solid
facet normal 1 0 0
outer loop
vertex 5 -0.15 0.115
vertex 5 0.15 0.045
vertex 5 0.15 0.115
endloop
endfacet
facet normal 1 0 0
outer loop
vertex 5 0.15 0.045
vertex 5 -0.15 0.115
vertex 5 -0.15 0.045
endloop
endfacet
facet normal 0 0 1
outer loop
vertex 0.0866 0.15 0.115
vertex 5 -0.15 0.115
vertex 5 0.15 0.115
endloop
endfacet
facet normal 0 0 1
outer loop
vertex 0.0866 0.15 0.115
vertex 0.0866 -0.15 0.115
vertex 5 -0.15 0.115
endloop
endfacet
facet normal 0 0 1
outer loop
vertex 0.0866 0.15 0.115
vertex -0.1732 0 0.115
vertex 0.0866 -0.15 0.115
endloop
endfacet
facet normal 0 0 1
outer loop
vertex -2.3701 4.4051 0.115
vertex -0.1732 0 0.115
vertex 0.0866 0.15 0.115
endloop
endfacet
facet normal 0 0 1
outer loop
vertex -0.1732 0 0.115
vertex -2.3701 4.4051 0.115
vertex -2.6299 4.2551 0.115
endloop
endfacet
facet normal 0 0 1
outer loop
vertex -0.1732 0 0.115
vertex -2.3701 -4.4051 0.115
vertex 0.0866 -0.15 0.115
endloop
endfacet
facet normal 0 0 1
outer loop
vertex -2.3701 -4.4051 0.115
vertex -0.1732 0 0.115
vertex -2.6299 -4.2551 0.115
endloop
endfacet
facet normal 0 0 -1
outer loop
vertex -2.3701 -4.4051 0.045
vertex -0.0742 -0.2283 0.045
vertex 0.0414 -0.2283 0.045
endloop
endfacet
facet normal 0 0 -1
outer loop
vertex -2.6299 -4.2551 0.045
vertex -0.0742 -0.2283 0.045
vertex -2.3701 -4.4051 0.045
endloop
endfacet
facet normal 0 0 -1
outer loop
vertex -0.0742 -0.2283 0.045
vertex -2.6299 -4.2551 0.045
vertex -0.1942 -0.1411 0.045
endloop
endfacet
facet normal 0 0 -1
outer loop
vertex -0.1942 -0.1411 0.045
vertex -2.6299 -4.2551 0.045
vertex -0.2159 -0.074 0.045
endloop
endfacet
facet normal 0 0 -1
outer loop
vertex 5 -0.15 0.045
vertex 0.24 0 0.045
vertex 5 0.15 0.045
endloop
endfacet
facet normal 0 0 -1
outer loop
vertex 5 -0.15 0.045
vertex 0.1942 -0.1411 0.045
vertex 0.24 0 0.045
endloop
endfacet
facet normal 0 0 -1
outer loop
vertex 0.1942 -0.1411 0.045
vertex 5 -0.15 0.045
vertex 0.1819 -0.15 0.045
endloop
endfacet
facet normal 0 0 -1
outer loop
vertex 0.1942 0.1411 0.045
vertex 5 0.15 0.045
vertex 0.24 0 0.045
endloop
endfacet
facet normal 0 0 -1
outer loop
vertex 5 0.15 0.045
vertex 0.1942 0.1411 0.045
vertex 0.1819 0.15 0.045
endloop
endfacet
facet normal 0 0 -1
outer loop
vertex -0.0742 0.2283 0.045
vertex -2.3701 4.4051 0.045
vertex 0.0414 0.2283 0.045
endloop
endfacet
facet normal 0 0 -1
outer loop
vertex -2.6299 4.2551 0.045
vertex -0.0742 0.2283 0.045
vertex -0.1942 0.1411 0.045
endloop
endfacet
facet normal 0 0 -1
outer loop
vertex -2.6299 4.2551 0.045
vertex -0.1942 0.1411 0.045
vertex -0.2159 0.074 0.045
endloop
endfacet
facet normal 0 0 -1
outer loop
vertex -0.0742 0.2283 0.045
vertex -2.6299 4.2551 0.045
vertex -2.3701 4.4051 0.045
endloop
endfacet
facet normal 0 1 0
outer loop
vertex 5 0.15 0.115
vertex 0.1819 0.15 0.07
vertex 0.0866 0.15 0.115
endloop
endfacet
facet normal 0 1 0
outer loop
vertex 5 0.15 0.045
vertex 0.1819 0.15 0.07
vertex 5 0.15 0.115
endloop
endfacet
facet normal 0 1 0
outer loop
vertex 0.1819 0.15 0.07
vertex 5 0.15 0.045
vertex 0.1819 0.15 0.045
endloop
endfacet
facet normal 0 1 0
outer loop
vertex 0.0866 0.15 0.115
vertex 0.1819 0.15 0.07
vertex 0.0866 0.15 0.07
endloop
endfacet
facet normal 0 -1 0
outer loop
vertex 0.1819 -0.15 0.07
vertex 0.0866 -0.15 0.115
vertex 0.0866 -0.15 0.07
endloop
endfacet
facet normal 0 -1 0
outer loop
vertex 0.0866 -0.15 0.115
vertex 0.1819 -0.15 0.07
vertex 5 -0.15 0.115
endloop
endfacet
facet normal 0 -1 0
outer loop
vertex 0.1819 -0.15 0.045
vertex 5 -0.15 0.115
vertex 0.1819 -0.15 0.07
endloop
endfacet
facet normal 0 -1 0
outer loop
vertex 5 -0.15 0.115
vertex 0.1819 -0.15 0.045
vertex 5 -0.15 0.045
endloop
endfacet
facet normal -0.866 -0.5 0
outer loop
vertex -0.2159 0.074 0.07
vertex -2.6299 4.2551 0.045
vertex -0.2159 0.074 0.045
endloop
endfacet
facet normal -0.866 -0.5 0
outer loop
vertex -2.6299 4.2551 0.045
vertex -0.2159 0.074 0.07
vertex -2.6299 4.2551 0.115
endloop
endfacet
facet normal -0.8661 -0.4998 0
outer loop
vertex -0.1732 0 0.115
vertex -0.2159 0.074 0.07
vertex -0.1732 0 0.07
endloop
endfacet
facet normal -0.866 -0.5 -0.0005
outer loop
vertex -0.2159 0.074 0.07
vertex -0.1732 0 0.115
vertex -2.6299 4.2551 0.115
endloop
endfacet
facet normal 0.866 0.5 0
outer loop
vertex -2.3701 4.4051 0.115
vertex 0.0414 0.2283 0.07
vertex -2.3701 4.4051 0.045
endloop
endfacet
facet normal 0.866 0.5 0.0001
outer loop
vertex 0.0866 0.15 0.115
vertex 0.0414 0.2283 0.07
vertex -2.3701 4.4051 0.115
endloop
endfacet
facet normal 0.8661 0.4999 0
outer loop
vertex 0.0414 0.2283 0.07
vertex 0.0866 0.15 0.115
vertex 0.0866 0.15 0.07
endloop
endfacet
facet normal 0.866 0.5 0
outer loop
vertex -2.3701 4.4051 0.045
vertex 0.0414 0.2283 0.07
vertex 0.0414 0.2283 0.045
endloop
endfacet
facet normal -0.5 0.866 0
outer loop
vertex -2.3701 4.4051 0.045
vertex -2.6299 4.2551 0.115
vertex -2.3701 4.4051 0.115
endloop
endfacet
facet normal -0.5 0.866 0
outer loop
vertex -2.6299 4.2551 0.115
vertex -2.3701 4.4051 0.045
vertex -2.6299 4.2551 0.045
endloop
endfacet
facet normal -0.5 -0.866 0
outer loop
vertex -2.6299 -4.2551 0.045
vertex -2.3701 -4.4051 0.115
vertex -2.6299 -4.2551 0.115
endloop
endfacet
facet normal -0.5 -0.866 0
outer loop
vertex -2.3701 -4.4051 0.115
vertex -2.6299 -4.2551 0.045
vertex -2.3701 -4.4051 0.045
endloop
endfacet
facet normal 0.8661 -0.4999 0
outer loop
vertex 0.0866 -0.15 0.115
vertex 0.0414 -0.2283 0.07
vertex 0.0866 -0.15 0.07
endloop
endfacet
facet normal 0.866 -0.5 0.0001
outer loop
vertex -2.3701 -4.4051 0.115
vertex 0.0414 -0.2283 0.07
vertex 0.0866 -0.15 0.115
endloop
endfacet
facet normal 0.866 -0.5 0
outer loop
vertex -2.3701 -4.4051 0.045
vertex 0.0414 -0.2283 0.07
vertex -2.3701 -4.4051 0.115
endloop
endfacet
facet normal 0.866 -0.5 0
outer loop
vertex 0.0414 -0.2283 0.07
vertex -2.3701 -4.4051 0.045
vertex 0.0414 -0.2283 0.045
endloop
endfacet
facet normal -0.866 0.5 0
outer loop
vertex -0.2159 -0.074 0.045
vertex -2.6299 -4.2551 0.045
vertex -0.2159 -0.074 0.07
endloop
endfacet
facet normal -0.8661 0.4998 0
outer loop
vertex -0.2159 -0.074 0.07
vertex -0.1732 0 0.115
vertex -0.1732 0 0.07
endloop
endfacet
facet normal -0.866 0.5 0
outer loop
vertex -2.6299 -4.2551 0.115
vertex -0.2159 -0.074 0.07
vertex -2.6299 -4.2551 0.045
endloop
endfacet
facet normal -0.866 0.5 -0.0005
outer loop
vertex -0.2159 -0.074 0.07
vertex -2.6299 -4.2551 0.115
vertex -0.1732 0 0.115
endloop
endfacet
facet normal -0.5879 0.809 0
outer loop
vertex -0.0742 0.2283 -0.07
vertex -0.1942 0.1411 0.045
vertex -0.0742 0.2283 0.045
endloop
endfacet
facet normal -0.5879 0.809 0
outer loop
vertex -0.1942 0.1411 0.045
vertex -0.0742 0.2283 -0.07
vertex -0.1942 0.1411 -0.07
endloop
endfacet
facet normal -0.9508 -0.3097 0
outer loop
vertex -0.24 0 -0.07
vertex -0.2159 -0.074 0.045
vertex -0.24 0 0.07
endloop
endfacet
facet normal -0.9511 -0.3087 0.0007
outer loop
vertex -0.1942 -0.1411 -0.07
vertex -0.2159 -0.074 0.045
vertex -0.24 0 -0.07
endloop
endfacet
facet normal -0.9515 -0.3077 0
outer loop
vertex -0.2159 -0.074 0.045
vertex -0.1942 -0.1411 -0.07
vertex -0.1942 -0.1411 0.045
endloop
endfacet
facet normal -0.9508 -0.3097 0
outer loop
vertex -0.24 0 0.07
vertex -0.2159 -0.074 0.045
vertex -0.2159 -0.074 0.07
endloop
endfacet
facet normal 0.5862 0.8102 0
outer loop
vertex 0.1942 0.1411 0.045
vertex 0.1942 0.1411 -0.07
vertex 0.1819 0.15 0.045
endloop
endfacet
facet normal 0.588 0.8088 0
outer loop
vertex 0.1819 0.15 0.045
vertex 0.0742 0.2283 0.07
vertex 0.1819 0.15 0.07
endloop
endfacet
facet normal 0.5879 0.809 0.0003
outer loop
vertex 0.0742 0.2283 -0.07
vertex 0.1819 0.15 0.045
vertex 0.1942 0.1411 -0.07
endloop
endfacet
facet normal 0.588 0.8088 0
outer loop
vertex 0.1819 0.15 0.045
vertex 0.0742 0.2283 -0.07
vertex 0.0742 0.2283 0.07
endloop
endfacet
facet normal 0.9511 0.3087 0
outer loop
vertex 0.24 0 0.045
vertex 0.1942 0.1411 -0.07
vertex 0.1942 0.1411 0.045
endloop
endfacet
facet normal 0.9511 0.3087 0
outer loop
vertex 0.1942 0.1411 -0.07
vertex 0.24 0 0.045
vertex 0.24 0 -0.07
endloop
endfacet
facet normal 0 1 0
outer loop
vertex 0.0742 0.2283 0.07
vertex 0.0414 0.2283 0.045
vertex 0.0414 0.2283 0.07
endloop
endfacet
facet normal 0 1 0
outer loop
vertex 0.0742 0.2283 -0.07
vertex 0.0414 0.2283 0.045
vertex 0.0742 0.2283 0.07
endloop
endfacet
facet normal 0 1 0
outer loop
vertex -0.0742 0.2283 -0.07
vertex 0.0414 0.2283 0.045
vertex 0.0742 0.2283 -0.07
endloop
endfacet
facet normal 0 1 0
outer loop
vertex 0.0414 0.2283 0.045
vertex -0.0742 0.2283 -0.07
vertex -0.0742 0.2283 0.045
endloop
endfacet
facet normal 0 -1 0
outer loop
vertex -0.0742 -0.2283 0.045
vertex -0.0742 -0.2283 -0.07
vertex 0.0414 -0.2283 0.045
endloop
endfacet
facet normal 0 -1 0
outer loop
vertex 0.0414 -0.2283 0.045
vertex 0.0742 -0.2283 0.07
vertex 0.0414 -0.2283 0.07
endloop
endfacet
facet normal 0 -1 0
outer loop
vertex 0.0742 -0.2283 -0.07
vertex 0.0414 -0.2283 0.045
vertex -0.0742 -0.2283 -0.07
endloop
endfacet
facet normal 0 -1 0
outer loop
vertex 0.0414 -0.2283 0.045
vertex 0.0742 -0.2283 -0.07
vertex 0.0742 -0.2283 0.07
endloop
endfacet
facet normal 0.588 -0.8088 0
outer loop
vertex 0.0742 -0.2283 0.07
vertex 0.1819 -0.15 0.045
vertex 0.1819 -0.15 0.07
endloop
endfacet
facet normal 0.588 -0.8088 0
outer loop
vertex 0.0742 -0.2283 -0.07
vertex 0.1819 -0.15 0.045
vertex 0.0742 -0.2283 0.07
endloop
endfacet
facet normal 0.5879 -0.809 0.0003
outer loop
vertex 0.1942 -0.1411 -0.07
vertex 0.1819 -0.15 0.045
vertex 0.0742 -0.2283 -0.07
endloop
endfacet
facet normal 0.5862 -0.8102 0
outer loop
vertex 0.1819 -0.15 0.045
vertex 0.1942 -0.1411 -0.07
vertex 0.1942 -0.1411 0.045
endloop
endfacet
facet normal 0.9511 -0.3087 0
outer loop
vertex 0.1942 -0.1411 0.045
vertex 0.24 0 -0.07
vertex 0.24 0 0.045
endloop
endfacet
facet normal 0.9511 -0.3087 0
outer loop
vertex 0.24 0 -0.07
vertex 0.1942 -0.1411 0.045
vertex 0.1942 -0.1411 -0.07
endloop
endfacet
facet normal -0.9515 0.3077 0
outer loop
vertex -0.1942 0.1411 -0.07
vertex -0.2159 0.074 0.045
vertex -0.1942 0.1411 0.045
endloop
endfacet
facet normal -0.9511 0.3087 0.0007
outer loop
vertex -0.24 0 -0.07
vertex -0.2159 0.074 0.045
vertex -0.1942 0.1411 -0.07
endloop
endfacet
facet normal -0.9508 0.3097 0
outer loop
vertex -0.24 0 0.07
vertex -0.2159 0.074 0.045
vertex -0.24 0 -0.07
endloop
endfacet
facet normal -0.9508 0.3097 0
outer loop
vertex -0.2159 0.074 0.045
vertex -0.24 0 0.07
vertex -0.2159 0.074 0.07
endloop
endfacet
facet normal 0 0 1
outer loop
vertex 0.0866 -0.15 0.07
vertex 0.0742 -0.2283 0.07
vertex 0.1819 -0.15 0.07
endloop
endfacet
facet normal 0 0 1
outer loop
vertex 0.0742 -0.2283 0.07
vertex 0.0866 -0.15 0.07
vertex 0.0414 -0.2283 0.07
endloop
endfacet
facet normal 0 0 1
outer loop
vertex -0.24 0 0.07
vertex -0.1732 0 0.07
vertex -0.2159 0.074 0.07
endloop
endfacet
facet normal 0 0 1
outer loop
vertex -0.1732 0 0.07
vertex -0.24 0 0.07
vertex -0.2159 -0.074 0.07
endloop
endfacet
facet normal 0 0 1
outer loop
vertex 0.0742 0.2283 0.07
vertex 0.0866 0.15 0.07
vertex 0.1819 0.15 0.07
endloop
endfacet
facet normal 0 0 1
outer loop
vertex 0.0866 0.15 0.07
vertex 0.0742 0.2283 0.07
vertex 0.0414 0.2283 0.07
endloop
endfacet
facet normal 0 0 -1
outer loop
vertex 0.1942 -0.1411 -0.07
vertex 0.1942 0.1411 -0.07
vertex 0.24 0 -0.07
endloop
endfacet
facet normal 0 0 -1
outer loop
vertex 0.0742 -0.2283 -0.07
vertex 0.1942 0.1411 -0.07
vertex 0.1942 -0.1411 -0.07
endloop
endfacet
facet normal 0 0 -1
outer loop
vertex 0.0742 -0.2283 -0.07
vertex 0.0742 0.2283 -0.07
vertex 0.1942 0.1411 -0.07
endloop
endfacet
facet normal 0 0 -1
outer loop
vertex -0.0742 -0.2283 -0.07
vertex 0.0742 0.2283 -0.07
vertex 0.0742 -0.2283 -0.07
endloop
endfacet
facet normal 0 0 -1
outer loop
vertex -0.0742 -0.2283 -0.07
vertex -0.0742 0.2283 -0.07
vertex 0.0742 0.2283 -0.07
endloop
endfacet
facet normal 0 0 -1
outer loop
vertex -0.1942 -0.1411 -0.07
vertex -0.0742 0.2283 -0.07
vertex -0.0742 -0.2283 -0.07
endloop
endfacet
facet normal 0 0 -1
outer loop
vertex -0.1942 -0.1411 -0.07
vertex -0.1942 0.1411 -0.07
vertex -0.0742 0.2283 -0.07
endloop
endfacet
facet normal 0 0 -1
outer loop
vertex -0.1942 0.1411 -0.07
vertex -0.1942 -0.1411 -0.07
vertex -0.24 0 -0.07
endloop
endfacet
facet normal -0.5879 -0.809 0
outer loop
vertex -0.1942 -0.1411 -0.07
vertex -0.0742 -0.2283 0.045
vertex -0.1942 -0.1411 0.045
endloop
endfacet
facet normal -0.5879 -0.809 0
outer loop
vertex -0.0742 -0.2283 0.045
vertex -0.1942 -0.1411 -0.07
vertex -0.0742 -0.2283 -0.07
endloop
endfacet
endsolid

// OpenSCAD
// Helicopter main rotor — 3-blade assembly. Rendered as a separate animated
// part that spins around the game-Y (vertical) axis. Origin is at the rotor
// hub centre so the renderer can spin all vertices around (0,0,0).
//
// Keep dimensions in sync with helicopter_body.scad.

$fn = 10;

body_cx = 0.8;
body_z  = 0.65;
body_h  = 2.0;
body_top = body_z + body_h;
mast_h  = 0.50;
mast_top = body_top + mast_h;

blade_l = 5.0;
blade_w = 0.30;
blade_h = 0.07;
n_main  = 3;

// Translate so the hub centre (body_cx, 0, mast_top) sits at origin.
translate([-body_cx, 0, -mast_top]) {
    // Hub disc
    color([0.32, 0.32, 0.35])
    translate([body_cx, 0, mast_top])
        cylinder(h = 0.14, r = 0.24, center = true);

    // Blades — each extends from hub centre outward in +X, rotated 120° apart
    color([0.12, 0.12, 0.14])
    for (i = [0 : n_main - 1])
        translate([body_cx, 0, mast_top + 0.08])
            rotate([0, 0, i * 360 / n_main])
                translate([blade_l / 2, 0, 0])
                    cube([blade_l, blade_w, blade_h], center = true);
}
